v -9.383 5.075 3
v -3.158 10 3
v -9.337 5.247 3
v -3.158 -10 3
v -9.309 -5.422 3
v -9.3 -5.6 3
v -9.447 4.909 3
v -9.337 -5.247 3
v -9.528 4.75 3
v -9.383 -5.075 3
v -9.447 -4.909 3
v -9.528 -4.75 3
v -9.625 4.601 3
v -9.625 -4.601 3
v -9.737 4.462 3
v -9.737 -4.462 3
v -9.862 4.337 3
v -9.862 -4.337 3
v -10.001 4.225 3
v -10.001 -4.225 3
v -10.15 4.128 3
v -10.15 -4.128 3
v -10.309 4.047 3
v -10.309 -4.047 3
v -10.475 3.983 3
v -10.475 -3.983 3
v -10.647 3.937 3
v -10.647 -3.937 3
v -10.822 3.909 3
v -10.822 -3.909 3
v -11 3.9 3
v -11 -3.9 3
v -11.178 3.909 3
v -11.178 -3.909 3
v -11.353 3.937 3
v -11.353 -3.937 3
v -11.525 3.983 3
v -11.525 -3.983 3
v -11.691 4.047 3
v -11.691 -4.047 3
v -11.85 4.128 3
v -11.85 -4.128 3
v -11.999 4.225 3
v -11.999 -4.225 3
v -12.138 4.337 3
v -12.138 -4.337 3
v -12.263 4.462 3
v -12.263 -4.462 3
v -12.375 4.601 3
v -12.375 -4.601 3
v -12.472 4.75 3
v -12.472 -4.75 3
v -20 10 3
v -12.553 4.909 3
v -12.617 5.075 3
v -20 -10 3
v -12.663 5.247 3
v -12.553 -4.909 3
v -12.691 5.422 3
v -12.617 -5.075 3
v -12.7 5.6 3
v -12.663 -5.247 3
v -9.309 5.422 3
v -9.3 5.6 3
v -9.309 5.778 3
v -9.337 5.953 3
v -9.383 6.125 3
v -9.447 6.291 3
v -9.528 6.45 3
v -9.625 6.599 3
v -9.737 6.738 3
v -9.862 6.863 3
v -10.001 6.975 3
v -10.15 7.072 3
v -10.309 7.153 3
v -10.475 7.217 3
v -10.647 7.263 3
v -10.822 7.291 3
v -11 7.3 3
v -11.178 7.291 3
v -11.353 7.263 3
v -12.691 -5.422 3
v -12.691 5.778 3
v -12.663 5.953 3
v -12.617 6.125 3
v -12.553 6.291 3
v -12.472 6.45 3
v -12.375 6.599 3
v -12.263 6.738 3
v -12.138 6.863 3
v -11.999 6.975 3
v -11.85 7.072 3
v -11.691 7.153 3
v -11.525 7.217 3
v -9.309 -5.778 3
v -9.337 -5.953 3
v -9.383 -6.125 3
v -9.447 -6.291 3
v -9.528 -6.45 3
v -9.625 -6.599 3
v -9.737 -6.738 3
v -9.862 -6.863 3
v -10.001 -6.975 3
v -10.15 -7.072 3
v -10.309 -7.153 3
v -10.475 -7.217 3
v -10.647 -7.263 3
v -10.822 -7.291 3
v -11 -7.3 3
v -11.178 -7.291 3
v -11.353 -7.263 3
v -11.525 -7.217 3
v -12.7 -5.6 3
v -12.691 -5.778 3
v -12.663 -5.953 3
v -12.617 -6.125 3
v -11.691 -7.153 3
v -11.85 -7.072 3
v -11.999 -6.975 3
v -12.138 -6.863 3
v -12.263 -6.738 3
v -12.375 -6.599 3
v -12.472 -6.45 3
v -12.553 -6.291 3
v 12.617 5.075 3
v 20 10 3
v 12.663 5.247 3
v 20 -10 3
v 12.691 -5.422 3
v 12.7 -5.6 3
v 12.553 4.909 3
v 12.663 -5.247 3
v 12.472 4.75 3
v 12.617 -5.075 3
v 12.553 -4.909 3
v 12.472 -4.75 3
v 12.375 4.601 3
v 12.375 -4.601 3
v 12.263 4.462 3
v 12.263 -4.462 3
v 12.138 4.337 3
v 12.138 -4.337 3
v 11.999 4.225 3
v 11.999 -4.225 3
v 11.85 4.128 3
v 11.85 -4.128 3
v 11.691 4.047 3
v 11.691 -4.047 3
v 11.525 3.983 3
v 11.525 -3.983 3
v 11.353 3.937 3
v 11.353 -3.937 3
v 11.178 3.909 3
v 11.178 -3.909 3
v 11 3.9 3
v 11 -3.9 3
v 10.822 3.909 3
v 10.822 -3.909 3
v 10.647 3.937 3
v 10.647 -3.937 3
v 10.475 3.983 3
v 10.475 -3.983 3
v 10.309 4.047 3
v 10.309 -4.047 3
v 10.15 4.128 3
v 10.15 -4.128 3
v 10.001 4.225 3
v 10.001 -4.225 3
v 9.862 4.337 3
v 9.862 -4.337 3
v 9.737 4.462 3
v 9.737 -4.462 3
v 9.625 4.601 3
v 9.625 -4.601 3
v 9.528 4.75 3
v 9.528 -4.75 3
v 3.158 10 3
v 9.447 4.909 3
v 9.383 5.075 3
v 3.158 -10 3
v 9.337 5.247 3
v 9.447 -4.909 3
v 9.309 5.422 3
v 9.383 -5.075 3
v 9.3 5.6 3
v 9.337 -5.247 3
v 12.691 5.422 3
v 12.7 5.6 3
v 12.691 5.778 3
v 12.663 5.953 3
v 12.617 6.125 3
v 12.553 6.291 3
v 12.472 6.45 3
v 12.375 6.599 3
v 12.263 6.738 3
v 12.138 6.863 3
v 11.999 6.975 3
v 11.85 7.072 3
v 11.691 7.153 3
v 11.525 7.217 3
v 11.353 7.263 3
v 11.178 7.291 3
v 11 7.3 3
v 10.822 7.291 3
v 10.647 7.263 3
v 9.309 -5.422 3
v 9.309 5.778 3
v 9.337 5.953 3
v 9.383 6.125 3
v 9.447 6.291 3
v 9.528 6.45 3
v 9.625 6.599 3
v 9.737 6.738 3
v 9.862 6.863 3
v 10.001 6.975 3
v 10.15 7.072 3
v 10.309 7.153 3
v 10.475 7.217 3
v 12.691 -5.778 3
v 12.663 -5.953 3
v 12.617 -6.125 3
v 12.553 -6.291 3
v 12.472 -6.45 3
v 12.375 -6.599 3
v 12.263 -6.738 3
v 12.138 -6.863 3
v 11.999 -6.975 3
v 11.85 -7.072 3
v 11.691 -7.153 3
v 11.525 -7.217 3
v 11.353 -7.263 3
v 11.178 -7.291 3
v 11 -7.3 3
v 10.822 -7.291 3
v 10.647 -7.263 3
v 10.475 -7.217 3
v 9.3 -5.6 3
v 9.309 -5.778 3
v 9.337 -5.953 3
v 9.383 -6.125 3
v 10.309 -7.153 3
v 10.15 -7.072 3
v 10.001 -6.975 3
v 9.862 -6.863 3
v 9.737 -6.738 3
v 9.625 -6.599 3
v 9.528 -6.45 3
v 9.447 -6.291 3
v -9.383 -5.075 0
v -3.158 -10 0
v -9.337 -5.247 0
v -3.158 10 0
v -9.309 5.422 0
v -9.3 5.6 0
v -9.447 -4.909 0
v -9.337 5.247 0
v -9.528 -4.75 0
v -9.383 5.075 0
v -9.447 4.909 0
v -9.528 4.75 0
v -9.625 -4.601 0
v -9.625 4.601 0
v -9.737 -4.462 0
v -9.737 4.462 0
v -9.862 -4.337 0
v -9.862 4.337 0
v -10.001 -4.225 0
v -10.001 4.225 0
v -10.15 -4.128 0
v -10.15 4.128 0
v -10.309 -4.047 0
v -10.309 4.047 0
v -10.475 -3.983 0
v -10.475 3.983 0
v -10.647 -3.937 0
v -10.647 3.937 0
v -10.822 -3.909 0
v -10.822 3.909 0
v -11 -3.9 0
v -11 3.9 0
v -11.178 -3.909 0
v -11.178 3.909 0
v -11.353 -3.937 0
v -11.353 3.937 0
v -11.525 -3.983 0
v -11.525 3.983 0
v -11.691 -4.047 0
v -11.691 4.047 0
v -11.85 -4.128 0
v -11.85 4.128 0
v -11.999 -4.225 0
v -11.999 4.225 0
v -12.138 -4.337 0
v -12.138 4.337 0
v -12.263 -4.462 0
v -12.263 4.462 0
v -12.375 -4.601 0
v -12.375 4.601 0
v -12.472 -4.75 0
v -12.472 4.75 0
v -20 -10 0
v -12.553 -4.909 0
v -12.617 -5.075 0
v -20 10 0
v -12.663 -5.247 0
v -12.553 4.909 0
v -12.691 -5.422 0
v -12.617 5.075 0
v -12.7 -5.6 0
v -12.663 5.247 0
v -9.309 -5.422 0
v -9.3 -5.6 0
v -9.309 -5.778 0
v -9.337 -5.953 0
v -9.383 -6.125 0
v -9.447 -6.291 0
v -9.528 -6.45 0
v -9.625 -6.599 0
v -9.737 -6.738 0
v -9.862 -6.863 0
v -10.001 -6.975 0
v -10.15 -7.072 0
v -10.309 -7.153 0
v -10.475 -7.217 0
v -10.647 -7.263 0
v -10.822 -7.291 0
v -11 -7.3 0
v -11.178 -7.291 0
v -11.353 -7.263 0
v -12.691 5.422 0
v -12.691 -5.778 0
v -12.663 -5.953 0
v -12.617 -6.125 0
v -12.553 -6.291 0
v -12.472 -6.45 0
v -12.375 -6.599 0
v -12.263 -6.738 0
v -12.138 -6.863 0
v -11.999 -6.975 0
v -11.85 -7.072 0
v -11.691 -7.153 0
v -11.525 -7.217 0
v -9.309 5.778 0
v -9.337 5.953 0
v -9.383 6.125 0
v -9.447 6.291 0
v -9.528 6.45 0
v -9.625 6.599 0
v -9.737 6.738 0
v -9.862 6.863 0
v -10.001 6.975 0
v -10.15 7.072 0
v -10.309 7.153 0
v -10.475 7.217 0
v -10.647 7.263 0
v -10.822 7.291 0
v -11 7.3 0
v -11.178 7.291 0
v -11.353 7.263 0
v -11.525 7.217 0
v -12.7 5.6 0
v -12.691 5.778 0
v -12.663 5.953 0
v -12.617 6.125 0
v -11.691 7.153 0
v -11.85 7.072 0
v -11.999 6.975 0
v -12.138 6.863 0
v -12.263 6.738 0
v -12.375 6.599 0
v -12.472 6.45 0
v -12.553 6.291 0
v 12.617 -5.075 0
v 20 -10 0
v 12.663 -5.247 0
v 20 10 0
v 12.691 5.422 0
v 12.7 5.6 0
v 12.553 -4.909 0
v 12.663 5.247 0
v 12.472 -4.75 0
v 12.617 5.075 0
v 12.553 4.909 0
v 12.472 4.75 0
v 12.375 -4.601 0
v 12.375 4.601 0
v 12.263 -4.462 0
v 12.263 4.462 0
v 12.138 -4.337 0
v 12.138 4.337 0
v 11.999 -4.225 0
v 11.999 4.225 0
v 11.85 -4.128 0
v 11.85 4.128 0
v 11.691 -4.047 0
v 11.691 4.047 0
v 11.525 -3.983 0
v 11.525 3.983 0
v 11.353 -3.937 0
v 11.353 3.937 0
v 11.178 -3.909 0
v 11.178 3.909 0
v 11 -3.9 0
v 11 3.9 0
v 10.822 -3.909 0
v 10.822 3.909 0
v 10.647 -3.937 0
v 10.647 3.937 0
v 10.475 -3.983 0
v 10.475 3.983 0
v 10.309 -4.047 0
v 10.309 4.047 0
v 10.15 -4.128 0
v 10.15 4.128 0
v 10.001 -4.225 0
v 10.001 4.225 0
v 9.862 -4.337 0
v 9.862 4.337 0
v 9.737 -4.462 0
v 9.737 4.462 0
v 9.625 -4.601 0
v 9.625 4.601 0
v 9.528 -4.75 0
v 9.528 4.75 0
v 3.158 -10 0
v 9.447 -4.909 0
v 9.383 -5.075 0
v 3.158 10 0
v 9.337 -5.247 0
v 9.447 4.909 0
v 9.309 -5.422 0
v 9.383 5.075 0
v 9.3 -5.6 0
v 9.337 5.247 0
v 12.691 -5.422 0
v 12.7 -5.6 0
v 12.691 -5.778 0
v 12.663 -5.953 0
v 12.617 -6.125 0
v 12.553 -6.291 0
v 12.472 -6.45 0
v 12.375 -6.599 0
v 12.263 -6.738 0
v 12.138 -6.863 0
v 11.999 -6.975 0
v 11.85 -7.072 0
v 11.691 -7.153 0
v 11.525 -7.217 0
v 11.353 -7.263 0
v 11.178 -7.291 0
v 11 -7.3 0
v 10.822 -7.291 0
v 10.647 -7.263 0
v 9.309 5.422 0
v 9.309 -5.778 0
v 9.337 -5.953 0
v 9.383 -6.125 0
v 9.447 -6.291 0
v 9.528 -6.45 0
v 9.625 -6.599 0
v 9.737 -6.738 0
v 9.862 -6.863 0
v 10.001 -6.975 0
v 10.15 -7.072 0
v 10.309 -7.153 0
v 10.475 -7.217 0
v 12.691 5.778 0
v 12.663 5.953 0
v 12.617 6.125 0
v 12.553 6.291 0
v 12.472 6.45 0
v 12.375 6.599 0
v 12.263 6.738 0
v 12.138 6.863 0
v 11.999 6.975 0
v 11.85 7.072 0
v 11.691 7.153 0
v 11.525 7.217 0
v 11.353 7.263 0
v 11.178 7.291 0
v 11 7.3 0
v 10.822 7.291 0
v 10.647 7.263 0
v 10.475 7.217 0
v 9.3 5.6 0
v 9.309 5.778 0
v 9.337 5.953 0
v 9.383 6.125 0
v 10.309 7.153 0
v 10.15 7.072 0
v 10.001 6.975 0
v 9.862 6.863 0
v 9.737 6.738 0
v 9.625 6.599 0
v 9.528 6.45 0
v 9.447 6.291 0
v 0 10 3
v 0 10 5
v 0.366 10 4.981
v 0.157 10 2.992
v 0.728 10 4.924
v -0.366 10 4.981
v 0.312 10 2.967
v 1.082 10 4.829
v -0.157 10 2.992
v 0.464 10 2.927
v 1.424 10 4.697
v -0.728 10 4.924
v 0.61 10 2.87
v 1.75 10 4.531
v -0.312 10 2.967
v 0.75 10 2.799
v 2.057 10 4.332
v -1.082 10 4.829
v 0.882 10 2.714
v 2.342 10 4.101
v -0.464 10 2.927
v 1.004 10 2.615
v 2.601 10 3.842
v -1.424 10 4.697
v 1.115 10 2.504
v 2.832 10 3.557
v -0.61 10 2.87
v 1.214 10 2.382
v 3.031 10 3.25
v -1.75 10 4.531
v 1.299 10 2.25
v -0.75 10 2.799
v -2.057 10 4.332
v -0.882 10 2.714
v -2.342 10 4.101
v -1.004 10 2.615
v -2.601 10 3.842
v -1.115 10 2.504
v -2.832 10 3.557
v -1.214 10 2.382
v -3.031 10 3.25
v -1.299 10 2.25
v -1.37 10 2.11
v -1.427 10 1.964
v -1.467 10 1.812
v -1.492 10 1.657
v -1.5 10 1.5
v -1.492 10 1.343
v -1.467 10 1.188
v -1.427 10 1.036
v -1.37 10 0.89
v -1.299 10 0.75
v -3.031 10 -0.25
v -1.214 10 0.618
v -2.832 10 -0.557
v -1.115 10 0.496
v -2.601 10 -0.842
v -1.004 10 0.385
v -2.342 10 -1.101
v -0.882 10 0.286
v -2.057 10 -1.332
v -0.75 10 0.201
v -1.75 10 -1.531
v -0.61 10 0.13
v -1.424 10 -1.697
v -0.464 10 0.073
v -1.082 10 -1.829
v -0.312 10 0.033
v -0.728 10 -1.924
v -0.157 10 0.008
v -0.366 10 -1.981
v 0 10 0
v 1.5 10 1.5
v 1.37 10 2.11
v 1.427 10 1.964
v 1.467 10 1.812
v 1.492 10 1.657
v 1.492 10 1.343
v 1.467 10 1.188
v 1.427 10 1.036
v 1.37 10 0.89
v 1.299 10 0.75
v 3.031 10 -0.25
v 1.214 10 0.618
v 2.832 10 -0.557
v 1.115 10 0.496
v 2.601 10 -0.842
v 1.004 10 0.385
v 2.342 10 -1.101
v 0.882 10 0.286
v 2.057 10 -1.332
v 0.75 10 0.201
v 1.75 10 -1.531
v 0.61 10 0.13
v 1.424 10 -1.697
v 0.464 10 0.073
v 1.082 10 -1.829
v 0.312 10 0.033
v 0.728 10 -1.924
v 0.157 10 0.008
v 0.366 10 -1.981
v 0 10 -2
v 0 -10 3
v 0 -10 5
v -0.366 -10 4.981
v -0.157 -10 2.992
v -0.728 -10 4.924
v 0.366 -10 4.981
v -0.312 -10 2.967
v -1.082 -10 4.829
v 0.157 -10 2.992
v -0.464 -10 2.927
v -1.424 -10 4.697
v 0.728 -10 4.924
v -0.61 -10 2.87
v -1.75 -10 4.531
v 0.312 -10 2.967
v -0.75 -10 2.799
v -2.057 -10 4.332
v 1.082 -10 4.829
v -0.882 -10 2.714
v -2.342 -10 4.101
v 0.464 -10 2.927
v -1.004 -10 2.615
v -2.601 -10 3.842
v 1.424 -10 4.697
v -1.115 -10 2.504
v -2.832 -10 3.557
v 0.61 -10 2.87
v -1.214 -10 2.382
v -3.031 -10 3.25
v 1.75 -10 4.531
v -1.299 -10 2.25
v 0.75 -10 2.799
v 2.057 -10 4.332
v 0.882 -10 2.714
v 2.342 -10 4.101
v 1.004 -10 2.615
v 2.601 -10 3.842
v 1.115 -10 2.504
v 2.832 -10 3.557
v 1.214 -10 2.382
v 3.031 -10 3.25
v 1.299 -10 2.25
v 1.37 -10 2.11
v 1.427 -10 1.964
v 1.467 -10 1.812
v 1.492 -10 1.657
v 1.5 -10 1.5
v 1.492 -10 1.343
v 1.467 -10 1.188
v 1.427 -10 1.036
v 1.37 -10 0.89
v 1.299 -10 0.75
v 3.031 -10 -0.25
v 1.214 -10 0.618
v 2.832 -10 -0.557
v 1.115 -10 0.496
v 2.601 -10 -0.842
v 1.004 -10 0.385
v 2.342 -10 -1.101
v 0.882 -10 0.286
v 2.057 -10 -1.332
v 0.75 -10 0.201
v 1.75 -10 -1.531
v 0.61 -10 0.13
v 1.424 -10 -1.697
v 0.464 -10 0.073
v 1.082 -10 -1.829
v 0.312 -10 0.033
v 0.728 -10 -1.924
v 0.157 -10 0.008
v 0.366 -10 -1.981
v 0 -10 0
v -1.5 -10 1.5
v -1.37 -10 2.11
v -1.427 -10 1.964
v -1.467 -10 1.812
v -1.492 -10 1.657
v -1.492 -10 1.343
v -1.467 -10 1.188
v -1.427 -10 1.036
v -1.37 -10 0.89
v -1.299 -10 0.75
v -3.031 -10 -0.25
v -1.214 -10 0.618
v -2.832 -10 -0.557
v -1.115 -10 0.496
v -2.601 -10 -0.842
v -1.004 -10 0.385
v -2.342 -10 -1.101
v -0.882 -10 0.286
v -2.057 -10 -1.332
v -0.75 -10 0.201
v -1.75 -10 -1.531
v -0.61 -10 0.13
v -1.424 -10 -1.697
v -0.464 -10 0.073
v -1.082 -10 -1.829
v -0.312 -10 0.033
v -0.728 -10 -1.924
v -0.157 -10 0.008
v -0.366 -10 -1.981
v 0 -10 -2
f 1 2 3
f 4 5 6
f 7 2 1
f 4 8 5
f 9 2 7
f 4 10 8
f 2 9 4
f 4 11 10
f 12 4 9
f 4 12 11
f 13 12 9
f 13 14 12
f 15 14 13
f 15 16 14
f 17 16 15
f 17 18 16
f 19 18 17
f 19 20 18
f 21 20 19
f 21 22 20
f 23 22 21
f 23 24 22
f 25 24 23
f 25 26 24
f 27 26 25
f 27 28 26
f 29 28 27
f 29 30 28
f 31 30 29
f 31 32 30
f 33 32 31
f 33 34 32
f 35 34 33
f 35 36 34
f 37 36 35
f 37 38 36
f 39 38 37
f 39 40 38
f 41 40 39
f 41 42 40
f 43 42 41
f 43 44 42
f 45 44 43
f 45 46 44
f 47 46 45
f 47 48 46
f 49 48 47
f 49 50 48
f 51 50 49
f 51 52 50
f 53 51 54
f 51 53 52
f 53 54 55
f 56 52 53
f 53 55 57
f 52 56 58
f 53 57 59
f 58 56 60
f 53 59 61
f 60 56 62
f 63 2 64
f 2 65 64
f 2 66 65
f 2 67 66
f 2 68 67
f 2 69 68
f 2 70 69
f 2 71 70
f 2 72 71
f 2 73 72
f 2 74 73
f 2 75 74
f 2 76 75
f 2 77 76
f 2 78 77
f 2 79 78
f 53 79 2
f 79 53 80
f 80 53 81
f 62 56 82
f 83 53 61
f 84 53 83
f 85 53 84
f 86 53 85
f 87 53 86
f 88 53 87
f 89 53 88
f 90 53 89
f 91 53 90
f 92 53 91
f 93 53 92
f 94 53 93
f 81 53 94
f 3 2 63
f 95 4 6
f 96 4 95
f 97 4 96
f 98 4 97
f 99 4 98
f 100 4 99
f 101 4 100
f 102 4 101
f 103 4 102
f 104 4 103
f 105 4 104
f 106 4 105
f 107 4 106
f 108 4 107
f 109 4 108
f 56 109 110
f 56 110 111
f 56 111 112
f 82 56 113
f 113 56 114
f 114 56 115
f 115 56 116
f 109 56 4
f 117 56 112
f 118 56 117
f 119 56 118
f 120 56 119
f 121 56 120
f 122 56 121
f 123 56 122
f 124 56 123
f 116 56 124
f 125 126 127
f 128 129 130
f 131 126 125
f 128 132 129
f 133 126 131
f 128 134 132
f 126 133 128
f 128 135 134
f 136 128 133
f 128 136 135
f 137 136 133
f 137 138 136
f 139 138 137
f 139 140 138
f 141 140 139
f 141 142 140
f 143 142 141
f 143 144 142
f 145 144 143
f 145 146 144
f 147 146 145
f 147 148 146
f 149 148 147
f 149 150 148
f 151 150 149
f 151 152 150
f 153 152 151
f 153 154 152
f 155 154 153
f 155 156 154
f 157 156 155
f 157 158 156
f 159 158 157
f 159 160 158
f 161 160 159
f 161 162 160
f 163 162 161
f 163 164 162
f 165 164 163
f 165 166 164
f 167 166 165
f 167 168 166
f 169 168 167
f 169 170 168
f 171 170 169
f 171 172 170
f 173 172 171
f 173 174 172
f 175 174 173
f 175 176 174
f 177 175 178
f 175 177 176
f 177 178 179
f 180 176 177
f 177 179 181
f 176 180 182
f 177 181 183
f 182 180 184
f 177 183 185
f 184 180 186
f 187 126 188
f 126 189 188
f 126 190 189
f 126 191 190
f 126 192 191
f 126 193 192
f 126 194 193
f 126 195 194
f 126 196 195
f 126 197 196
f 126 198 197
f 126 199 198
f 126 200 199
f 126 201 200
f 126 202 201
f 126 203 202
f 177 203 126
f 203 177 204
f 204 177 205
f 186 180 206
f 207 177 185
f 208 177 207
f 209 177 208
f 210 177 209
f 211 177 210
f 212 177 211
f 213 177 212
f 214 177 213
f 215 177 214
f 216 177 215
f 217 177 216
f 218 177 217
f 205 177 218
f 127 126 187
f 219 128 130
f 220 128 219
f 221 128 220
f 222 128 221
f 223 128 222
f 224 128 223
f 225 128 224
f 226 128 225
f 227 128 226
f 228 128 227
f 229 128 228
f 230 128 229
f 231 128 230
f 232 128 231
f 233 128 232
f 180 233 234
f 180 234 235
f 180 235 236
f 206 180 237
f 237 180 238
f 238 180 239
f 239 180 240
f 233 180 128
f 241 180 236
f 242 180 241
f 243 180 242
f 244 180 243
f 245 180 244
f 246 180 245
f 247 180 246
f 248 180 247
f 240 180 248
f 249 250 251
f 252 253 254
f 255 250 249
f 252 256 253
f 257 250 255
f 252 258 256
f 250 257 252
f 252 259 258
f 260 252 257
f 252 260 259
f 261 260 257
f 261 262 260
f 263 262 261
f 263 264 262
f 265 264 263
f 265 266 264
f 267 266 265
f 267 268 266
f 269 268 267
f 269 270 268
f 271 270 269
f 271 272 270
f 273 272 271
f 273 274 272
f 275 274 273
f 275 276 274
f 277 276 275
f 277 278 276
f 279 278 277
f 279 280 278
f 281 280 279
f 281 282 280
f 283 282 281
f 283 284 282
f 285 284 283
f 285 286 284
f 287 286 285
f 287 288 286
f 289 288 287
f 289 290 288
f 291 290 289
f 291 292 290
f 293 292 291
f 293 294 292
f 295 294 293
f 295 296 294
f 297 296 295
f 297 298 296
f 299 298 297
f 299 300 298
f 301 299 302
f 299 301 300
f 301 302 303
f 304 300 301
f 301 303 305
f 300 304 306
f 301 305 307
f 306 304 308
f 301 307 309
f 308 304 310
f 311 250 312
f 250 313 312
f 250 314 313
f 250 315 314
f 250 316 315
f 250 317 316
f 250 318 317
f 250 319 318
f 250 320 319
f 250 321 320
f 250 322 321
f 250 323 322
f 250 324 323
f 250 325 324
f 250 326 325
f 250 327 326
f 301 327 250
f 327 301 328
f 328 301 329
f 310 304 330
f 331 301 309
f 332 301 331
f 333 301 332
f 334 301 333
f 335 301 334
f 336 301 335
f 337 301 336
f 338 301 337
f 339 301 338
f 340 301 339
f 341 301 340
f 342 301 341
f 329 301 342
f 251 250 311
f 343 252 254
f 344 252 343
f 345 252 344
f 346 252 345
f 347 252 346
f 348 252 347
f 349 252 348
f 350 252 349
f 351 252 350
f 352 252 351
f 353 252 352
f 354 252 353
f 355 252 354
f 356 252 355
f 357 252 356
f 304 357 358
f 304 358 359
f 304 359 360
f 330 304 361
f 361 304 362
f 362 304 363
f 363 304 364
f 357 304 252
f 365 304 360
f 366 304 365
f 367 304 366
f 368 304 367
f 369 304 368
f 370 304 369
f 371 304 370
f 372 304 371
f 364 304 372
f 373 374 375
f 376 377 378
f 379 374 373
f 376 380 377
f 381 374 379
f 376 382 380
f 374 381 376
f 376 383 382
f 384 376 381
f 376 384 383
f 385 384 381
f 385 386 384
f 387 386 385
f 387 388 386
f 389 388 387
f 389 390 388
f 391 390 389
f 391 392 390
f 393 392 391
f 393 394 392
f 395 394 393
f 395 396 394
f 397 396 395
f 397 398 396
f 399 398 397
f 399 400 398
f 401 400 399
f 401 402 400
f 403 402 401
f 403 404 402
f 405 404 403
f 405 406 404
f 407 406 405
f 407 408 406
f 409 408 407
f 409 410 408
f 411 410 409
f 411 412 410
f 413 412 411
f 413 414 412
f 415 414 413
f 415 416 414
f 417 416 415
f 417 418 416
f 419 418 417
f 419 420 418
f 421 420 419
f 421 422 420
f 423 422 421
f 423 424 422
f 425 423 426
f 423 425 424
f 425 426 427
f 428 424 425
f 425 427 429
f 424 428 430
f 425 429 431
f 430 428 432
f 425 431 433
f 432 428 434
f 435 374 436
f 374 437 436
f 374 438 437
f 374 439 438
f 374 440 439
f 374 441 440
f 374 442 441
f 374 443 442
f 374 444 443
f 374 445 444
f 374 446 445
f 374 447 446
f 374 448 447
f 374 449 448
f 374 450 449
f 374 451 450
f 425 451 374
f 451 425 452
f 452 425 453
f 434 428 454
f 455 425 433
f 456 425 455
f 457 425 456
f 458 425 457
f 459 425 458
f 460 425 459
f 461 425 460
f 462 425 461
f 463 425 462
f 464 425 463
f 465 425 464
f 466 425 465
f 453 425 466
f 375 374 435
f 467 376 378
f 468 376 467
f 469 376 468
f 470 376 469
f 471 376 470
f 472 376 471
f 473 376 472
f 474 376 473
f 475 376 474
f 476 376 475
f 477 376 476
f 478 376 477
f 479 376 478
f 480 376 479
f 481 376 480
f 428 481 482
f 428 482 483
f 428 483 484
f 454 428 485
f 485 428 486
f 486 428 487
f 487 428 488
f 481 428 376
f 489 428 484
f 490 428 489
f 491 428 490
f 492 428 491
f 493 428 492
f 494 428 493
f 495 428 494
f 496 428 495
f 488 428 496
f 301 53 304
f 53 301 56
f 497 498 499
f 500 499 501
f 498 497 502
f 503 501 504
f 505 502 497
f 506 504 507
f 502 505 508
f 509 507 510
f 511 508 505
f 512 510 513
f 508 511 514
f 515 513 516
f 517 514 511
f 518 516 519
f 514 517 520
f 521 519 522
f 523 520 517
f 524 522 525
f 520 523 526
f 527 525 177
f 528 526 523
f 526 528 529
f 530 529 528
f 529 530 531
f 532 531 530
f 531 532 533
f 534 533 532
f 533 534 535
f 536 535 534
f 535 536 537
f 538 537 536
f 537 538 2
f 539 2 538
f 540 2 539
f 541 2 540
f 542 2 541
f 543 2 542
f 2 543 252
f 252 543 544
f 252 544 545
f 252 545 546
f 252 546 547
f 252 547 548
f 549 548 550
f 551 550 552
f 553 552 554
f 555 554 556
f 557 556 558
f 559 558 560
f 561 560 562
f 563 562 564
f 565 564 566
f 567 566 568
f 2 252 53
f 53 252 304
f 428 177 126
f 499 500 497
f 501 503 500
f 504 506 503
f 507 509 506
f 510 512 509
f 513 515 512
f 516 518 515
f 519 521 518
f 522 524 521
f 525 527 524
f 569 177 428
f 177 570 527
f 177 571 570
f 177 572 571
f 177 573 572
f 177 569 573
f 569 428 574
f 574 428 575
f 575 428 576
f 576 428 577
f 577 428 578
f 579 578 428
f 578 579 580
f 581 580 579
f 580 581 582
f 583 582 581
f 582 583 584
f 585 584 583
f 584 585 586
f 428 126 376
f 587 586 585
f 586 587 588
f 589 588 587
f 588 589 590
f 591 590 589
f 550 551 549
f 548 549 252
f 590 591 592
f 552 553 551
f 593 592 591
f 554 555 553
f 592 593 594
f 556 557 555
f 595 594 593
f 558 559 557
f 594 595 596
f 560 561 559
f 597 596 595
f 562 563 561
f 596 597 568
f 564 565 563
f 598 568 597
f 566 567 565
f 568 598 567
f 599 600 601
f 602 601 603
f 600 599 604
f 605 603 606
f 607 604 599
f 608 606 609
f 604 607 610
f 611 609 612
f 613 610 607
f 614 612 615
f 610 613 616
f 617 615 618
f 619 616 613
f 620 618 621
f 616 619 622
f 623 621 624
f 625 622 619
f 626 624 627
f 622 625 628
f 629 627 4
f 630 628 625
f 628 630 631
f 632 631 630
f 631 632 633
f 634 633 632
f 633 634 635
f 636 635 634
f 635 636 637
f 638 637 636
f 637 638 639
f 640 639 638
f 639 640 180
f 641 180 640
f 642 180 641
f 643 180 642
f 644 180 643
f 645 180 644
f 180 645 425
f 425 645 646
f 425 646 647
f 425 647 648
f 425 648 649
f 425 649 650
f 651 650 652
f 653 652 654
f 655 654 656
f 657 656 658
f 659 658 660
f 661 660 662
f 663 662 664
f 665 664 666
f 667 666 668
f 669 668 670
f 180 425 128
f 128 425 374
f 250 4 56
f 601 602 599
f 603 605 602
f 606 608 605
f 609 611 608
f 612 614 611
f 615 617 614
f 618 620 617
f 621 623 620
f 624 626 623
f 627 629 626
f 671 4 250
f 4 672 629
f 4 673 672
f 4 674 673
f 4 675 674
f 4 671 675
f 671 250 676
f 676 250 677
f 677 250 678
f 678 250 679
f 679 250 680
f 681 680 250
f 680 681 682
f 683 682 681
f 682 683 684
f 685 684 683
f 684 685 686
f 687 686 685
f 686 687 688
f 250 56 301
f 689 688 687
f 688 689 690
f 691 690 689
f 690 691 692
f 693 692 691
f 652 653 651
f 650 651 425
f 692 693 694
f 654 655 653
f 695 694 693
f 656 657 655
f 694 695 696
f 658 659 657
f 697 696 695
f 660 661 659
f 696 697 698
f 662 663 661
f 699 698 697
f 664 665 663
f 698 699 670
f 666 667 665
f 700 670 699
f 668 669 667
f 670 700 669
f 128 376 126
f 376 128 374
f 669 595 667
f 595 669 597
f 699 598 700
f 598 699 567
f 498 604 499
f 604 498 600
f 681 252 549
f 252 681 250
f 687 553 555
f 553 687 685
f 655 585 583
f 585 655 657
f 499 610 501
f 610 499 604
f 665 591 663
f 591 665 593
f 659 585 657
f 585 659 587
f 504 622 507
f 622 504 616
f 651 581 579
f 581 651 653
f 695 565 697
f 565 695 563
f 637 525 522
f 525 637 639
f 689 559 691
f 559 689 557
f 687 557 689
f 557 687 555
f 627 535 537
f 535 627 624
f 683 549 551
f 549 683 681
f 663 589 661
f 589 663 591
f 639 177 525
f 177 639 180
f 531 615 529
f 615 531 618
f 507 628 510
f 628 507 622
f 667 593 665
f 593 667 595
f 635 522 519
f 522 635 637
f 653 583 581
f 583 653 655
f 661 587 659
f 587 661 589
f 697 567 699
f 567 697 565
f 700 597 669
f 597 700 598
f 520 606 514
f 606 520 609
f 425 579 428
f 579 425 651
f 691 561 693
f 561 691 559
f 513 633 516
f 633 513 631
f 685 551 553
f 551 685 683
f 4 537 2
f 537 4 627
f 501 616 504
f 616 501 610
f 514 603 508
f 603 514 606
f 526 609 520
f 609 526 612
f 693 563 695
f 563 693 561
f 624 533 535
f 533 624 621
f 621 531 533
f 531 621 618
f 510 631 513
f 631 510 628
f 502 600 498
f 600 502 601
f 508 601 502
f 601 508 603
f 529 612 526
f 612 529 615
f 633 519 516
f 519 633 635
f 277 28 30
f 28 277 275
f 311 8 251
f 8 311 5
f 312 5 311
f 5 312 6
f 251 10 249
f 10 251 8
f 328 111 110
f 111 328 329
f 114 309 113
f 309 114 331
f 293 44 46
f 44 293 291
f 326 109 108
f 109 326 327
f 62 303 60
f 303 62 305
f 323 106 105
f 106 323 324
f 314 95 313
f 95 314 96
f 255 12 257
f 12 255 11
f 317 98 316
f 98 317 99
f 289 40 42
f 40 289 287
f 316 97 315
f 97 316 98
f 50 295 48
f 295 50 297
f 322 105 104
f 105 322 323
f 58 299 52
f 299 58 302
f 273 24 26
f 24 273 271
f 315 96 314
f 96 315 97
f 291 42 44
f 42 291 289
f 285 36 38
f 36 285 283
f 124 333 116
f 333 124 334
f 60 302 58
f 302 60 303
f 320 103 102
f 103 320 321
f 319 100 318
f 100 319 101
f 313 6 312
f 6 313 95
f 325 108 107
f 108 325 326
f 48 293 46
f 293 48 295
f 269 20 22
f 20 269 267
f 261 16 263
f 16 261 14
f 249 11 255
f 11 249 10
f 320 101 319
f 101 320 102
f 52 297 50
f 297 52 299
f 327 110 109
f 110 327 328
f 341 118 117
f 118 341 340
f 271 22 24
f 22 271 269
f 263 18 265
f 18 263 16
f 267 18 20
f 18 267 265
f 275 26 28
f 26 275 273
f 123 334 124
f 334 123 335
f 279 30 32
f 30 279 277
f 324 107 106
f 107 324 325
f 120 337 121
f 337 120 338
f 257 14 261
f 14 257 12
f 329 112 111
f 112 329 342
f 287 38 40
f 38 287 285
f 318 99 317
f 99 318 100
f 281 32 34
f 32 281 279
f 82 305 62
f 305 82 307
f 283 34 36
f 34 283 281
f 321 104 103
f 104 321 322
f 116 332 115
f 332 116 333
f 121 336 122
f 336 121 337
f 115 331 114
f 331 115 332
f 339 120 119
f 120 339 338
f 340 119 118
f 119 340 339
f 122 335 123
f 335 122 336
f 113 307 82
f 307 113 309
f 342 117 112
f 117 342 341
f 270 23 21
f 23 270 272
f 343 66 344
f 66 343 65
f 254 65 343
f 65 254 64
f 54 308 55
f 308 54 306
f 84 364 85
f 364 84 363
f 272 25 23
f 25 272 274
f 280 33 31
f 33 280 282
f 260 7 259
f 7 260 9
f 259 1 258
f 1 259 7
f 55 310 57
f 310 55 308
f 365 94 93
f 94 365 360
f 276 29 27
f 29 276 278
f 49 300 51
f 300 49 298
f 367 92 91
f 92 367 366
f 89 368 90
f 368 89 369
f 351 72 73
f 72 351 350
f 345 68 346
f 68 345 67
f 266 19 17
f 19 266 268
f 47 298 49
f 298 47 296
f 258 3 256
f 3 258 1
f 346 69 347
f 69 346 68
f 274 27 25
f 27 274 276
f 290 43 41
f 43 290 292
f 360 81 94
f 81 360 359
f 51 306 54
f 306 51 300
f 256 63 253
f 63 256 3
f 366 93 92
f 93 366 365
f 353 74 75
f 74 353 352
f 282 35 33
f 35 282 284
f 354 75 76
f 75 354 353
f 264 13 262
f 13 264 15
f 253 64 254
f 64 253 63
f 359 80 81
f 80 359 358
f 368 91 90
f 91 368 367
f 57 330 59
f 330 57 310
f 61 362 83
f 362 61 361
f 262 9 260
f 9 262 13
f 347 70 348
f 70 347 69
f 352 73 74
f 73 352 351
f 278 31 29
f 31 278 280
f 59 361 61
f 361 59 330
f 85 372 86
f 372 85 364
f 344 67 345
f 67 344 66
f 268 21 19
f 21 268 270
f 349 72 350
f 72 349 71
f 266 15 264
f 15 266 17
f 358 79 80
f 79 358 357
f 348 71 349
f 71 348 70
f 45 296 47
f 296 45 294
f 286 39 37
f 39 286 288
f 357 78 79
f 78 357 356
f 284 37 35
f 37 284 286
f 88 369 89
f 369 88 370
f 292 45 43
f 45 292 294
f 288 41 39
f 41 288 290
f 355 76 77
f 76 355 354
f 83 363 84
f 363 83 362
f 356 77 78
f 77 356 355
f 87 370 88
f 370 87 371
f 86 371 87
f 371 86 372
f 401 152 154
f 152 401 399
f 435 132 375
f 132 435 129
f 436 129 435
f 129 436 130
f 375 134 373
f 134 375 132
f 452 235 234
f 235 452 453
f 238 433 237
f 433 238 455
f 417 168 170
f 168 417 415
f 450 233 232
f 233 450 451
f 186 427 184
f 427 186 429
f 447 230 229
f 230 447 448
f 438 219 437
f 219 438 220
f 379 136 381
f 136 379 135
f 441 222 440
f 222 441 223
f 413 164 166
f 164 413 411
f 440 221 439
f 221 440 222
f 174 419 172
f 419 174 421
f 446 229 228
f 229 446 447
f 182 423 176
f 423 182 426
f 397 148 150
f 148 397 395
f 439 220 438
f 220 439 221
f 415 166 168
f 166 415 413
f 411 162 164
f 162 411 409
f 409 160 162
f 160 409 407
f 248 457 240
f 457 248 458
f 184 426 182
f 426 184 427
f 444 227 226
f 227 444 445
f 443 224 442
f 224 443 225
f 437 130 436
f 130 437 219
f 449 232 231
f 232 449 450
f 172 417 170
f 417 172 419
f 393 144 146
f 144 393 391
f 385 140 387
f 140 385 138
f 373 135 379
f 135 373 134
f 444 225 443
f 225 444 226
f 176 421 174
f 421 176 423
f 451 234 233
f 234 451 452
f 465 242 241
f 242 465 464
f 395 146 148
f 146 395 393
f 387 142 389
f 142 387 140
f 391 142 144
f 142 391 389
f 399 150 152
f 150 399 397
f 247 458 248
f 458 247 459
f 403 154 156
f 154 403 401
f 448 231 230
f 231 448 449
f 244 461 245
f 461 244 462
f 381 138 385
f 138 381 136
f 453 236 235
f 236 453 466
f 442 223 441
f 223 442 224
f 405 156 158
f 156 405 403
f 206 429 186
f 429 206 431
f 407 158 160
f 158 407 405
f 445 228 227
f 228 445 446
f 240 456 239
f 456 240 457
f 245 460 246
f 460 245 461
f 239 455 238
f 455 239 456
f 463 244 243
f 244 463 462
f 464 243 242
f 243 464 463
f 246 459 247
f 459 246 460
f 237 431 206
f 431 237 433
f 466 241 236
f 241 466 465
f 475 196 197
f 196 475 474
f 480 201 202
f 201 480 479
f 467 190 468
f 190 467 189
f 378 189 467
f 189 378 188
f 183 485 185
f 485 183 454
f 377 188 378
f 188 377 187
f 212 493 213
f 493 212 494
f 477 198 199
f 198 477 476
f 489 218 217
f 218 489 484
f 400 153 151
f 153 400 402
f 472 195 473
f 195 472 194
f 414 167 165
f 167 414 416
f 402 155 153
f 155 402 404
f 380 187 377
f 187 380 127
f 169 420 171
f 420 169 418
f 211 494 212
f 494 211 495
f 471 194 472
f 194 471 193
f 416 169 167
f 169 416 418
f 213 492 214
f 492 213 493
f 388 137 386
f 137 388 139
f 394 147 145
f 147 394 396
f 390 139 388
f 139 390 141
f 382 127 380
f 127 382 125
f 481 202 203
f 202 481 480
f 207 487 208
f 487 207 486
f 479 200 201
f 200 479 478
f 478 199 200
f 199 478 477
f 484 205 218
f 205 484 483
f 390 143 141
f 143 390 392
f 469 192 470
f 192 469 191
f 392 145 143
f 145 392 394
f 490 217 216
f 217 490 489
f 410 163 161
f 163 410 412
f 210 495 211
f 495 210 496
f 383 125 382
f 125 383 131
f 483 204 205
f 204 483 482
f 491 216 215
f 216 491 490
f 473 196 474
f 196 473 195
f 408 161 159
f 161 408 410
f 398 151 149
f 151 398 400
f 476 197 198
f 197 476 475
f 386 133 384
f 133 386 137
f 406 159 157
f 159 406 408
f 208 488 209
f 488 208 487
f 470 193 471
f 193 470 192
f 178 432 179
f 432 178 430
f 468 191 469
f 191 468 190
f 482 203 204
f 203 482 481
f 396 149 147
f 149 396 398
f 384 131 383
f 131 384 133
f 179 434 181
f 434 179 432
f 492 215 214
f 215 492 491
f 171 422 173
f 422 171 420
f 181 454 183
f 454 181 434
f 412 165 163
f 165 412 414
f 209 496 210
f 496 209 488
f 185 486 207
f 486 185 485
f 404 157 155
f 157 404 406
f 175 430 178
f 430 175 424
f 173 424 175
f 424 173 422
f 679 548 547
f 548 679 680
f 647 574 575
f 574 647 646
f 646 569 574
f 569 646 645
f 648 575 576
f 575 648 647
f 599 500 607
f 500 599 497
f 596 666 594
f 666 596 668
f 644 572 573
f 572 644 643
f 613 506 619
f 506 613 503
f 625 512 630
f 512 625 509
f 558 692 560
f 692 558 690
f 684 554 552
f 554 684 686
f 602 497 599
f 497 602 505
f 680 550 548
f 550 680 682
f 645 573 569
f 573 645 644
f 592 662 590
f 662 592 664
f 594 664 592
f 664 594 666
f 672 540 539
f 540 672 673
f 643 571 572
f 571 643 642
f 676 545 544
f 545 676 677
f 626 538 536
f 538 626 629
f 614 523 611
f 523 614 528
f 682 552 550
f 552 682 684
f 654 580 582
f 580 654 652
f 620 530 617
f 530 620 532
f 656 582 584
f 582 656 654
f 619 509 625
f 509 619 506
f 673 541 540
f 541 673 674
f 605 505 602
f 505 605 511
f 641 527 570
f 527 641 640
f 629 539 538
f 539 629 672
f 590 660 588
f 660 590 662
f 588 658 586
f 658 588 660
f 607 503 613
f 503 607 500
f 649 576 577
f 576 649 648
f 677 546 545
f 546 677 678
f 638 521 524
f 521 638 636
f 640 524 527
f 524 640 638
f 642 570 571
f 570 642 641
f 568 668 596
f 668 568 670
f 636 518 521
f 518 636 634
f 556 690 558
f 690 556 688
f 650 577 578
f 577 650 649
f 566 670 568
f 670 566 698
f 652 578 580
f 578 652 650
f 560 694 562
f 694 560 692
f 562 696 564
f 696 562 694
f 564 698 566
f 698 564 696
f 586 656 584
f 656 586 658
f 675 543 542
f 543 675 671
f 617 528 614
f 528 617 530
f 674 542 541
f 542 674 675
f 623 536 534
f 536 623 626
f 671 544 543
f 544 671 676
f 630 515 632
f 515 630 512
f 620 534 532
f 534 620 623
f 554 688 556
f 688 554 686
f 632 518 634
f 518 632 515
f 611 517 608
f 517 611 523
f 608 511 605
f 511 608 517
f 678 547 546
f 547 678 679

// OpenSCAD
// Two-leaf hinge with a printable straight pin barrel.
$fn = 60;
eps = 0.02;
leaf_l = 20;
leaf_w = 20;
leaf_t = 3;
pin_d = 3;
barrel_d = pin_d + 4;
difference() {
    union() {
        translate([-leaf_l, -leaf_w / 2, 0]) cube([leaf_l, leaf_w, leaf_t]);
        translate([0, -leaf_w / 2, 0]) cube([leaf_l, leaf_w, leaf_t]);
        translate([0, -leaf_w / 2, leaf_t / 2]) rotate([-90, 0, 0]) cylinder(d = barrel_d, h = leaf_w);
    }
    translate([0, -leaf_w / 2 - eps, leaf_t / 2]) rotate([-90, 0, 0]) cylinder(d = pin_d, h = leaf_w + 2 * eps);
    for (x = [-leaf_l * 0.55, leaf_l * 0.55], y = [-leaf_w * 0.28, leaf_w * 0.28])
        translate([x, y, -eps]) cylinder(d = 3.4, h = leaf_t + 2 * eps);
}
